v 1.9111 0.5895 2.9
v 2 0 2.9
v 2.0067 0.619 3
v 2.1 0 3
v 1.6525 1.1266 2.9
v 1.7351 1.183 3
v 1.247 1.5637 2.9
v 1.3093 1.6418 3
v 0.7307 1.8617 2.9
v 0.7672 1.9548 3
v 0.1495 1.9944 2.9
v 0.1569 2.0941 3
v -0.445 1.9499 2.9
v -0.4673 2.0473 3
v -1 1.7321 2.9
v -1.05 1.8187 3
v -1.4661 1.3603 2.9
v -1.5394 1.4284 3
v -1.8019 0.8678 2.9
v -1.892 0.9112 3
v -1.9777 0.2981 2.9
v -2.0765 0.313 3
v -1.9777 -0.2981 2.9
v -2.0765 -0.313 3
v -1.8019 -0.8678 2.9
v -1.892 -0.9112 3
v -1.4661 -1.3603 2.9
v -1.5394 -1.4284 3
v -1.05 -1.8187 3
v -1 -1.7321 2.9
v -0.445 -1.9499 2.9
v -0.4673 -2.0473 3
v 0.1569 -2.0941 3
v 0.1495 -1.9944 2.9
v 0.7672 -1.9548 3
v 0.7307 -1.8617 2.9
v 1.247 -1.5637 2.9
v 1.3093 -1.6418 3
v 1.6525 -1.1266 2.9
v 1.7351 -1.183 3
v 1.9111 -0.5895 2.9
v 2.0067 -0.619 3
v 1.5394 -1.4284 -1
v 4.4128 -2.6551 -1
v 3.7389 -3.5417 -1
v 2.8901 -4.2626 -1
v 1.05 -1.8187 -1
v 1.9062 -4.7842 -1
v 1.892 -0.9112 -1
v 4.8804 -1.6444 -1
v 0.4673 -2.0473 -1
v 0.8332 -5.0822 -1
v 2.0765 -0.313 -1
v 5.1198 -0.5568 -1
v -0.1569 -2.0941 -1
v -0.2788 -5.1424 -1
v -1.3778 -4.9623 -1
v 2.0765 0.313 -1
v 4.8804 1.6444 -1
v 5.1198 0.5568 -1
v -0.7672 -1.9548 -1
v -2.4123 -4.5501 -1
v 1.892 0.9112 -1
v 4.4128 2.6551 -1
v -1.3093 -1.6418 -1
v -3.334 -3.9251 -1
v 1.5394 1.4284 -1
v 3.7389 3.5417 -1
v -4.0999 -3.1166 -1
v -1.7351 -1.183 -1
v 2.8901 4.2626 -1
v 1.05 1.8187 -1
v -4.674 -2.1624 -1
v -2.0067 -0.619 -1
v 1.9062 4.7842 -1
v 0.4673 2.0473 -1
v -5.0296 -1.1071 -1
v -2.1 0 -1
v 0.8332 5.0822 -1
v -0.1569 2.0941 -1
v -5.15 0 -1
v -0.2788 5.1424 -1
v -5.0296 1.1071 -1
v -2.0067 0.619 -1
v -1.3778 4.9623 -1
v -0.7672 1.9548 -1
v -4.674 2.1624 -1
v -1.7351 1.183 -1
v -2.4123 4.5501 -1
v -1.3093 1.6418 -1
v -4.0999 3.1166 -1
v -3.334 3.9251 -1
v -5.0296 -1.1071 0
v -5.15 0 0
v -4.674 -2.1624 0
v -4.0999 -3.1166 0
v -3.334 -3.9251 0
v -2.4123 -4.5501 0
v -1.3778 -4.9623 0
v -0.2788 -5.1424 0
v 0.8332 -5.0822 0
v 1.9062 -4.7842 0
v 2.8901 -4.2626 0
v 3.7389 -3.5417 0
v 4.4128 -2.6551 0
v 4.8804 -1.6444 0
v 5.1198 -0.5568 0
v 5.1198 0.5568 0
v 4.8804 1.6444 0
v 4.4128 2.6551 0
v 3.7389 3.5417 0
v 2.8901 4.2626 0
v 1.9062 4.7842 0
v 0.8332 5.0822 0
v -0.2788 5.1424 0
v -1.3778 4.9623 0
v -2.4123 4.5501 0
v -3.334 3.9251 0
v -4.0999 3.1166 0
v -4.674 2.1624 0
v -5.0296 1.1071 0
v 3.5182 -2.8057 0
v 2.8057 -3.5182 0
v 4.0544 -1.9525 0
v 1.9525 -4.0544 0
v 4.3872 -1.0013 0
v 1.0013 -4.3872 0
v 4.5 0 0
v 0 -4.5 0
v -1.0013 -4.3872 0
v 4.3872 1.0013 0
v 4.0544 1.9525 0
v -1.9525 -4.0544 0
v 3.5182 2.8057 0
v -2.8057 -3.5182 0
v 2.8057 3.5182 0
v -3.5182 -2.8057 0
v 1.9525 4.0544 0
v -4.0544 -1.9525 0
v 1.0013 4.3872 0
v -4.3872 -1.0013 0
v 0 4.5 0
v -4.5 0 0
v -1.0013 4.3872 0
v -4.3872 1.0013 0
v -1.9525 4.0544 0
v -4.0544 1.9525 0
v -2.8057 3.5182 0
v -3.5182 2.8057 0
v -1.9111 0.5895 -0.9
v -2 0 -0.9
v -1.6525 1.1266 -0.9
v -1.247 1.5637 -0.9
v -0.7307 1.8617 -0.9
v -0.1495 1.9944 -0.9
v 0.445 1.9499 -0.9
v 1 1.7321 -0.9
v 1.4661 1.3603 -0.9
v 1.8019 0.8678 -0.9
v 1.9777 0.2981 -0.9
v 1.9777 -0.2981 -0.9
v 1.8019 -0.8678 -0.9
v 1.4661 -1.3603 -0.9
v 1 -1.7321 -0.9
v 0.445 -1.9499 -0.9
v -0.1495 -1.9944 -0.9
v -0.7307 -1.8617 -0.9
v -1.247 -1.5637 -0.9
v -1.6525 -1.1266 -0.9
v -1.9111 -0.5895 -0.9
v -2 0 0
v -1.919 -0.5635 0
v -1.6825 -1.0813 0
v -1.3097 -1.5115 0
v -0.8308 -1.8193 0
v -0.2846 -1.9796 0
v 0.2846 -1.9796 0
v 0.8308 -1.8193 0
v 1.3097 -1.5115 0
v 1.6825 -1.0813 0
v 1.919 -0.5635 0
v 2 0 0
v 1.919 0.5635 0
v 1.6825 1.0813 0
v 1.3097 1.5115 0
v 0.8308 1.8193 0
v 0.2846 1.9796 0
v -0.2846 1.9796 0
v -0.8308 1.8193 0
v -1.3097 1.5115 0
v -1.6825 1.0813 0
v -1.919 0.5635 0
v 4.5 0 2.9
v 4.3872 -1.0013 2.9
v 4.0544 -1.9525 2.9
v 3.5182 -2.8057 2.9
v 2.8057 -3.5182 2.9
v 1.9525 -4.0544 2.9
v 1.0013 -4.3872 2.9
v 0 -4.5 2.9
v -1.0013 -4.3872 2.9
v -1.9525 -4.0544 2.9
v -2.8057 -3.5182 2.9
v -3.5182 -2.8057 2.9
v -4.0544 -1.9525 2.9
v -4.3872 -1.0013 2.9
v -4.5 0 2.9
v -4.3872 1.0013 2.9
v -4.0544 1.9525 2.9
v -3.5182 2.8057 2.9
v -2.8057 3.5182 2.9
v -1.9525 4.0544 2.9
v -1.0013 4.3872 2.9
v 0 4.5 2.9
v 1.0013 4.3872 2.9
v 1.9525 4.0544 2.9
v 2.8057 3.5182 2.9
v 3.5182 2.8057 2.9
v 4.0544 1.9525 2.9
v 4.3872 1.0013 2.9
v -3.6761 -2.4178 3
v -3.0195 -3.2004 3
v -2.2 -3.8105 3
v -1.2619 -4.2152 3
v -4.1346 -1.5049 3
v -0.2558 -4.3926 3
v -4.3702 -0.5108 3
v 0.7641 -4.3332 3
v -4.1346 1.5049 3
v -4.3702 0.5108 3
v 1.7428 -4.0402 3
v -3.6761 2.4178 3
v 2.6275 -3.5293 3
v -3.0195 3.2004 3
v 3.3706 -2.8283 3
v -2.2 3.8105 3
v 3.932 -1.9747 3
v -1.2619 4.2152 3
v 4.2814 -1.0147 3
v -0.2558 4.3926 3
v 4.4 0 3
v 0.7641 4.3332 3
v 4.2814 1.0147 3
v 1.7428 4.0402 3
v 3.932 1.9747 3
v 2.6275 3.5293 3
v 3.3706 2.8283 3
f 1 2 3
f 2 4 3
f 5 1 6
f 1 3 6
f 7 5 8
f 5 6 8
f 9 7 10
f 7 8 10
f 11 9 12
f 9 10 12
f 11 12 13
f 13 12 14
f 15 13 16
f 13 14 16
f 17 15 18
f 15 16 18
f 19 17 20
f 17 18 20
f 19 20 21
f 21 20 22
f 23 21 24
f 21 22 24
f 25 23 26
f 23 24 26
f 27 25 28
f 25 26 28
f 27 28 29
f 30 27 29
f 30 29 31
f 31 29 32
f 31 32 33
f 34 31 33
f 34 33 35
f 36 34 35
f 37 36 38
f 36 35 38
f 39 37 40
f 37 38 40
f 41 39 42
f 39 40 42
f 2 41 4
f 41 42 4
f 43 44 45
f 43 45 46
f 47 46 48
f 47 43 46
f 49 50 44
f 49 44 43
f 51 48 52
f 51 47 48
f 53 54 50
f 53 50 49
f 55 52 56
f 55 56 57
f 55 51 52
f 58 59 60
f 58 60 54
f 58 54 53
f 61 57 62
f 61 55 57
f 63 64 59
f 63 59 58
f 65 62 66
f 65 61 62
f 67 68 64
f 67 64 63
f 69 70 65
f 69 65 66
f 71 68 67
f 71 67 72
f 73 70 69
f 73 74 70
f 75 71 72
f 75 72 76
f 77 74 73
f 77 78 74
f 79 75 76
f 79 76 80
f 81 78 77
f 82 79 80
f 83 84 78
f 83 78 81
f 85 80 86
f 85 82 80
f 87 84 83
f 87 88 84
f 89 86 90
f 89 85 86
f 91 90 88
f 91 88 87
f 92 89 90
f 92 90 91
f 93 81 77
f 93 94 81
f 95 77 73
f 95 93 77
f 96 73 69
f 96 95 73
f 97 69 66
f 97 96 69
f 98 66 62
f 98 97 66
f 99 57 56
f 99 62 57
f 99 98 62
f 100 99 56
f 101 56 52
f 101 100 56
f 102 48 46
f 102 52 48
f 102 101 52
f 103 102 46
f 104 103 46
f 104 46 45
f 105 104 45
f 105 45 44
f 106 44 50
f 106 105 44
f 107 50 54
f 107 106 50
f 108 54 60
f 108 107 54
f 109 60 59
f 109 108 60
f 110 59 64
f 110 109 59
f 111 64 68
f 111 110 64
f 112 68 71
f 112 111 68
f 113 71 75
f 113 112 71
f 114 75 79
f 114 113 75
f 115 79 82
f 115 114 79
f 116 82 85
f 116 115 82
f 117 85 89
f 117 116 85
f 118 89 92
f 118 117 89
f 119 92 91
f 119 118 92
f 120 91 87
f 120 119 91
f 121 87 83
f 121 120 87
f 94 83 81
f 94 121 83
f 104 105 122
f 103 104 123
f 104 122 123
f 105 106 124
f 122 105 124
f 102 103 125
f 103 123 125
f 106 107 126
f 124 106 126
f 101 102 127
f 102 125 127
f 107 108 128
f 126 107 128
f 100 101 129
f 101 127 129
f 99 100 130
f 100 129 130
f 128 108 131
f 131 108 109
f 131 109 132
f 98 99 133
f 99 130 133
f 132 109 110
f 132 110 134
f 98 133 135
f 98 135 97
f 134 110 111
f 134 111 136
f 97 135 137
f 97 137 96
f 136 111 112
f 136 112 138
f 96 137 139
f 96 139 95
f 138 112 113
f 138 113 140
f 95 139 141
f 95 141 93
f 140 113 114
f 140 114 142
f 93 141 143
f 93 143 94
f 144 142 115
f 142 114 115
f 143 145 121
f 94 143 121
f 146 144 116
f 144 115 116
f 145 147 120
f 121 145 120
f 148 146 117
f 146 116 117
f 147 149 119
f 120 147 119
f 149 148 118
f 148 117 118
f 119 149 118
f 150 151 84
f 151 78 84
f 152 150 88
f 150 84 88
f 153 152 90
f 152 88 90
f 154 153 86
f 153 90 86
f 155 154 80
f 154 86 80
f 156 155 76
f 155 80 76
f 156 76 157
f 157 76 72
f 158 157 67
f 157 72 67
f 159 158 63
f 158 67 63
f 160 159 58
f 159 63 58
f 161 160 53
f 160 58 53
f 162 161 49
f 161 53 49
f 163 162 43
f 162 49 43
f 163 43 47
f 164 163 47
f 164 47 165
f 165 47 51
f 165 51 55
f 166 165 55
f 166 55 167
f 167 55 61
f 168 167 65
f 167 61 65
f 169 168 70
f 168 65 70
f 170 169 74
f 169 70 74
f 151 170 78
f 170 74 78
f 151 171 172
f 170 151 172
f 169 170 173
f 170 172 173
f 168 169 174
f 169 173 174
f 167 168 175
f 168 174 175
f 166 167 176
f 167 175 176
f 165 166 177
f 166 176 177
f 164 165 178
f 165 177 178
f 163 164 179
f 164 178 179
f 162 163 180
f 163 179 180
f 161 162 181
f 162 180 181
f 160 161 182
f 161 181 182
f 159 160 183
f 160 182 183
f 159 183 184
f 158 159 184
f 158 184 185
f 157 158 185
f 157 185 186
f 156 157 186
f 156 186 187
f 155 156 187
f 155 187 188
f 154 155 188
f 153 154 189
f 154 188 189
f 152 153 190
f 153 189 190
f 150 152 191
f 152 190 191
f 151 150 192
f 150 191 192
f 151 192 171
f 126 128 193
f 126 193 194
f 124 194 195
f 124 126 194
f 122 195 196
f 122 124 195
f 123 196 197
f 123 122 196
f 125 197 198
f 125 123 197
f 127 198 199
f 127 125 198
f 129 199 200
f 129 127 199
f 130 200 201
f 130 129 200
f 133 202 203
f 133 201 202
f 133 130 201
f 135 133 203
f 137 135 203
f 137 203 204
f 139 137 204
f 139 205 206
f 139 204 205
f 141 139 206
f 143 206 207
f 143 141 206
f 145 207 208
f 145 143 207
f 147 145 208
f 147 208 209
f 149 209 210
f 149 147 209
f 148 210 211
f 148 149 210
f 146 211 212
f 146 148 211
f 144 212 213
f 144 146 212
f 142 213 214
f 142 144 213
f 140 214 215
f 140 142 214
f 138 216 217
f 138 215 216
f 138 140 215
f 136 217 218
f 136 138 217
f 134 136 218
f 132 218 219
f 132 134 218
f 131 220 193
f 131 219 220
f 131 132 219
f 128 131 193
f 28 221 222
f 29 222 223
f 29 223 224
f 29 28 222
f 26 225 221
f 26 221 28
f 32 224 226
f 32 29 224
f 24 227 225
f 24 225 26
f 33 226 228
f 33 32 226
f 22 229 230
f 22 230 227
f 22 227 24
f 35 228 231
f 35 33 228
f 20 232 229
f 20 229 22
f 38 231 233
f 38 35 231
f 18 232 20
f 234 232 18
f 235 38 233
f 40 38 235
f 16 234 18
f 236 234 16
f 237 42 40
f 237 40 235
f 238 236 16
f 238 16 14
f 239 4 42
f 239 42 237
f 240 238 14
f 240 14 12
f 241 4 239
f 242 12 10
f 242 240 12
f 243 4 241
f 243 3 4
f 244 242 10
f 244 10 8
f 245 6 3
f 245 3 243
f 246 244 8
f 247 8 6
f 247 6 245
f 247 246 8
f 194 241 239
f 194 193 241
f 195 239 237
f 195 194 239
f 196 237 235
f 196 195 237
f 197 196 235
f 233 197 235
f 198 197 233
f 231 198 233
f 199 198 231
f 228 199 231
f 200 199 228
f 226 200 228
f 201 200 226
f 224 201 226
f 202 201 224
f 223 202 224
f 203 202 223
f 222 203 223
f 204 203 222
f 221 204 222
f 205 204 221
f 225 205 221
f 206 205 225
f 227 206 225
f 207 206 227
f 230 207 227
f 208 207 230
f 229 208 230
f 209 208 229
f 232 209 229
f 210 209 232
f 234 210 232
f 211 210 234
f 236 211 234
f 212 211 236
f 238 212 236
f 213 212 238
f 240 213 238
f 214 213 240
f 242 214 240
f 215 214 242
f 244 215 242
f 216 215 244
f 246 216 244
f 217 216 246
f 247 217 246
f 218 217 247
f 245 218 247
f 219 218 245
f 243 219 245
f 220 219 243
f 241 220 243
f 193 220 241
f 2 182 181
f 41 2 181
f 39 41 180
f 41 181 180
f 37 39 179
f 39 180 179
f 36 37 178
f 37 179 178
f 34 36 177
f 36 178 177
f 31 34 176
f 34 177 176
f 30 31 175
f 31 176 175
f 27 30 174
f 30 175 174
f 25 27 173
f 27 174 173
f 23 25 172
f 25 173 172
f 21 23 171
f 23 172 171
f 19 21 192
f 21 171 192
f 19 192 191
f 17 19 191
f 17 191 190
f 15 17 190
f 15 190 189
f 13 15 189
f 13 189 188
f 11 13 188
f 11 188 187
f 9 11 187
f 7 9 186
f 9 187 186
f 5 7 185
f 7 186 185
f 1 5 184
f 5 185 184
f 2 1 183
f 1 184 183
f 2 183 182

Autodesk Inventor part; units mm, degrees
ref_plane "YZ Plane" through (0, 0, 0) normal (1, 0, 0) x (0, 1, 0)
ref_plane "XZ Plane" through (0, 0, 0) normal (0, 1, 0) x (-1, 0, 0)
ref_plane "XY Plane" through (0, 0, 0) normal (0, 0, 1) x (1, 0, 0)
sketch "スケッチ1" plane through (0, 0, 0) normal (0, 0, 1) x (1, 0, 0)
  circle A0 centre (0, 0) radius 2
  circle A1 centre (0, 0) radius 4.5
  dimension "d0" = 4
  dimension "d1" = 9
extrude "押し出し1" add sketch "スケッチ1" along normal blind 3
sketch "スケッチ2" plane through (0, 0, 0) normal (0, 0, -1) x (-1, 0, 0)
  circle A0 centre (0, 0) radius 2
  circle A1 centre (0, 0) radius 5.15
  dimension "d4" = 4
  dimension "d5" = 10.3
extrude "押し出し2" add sketch "スケッチ2" along normal blind 1
chamfer "面取り1" distance 0.1 angle 45 3 edges at (-4.5, 0, 3) (-2, 0, 3) (2, 0, -1)
properties part number "ベアリング　4.9" material "ステンレス鋼"
